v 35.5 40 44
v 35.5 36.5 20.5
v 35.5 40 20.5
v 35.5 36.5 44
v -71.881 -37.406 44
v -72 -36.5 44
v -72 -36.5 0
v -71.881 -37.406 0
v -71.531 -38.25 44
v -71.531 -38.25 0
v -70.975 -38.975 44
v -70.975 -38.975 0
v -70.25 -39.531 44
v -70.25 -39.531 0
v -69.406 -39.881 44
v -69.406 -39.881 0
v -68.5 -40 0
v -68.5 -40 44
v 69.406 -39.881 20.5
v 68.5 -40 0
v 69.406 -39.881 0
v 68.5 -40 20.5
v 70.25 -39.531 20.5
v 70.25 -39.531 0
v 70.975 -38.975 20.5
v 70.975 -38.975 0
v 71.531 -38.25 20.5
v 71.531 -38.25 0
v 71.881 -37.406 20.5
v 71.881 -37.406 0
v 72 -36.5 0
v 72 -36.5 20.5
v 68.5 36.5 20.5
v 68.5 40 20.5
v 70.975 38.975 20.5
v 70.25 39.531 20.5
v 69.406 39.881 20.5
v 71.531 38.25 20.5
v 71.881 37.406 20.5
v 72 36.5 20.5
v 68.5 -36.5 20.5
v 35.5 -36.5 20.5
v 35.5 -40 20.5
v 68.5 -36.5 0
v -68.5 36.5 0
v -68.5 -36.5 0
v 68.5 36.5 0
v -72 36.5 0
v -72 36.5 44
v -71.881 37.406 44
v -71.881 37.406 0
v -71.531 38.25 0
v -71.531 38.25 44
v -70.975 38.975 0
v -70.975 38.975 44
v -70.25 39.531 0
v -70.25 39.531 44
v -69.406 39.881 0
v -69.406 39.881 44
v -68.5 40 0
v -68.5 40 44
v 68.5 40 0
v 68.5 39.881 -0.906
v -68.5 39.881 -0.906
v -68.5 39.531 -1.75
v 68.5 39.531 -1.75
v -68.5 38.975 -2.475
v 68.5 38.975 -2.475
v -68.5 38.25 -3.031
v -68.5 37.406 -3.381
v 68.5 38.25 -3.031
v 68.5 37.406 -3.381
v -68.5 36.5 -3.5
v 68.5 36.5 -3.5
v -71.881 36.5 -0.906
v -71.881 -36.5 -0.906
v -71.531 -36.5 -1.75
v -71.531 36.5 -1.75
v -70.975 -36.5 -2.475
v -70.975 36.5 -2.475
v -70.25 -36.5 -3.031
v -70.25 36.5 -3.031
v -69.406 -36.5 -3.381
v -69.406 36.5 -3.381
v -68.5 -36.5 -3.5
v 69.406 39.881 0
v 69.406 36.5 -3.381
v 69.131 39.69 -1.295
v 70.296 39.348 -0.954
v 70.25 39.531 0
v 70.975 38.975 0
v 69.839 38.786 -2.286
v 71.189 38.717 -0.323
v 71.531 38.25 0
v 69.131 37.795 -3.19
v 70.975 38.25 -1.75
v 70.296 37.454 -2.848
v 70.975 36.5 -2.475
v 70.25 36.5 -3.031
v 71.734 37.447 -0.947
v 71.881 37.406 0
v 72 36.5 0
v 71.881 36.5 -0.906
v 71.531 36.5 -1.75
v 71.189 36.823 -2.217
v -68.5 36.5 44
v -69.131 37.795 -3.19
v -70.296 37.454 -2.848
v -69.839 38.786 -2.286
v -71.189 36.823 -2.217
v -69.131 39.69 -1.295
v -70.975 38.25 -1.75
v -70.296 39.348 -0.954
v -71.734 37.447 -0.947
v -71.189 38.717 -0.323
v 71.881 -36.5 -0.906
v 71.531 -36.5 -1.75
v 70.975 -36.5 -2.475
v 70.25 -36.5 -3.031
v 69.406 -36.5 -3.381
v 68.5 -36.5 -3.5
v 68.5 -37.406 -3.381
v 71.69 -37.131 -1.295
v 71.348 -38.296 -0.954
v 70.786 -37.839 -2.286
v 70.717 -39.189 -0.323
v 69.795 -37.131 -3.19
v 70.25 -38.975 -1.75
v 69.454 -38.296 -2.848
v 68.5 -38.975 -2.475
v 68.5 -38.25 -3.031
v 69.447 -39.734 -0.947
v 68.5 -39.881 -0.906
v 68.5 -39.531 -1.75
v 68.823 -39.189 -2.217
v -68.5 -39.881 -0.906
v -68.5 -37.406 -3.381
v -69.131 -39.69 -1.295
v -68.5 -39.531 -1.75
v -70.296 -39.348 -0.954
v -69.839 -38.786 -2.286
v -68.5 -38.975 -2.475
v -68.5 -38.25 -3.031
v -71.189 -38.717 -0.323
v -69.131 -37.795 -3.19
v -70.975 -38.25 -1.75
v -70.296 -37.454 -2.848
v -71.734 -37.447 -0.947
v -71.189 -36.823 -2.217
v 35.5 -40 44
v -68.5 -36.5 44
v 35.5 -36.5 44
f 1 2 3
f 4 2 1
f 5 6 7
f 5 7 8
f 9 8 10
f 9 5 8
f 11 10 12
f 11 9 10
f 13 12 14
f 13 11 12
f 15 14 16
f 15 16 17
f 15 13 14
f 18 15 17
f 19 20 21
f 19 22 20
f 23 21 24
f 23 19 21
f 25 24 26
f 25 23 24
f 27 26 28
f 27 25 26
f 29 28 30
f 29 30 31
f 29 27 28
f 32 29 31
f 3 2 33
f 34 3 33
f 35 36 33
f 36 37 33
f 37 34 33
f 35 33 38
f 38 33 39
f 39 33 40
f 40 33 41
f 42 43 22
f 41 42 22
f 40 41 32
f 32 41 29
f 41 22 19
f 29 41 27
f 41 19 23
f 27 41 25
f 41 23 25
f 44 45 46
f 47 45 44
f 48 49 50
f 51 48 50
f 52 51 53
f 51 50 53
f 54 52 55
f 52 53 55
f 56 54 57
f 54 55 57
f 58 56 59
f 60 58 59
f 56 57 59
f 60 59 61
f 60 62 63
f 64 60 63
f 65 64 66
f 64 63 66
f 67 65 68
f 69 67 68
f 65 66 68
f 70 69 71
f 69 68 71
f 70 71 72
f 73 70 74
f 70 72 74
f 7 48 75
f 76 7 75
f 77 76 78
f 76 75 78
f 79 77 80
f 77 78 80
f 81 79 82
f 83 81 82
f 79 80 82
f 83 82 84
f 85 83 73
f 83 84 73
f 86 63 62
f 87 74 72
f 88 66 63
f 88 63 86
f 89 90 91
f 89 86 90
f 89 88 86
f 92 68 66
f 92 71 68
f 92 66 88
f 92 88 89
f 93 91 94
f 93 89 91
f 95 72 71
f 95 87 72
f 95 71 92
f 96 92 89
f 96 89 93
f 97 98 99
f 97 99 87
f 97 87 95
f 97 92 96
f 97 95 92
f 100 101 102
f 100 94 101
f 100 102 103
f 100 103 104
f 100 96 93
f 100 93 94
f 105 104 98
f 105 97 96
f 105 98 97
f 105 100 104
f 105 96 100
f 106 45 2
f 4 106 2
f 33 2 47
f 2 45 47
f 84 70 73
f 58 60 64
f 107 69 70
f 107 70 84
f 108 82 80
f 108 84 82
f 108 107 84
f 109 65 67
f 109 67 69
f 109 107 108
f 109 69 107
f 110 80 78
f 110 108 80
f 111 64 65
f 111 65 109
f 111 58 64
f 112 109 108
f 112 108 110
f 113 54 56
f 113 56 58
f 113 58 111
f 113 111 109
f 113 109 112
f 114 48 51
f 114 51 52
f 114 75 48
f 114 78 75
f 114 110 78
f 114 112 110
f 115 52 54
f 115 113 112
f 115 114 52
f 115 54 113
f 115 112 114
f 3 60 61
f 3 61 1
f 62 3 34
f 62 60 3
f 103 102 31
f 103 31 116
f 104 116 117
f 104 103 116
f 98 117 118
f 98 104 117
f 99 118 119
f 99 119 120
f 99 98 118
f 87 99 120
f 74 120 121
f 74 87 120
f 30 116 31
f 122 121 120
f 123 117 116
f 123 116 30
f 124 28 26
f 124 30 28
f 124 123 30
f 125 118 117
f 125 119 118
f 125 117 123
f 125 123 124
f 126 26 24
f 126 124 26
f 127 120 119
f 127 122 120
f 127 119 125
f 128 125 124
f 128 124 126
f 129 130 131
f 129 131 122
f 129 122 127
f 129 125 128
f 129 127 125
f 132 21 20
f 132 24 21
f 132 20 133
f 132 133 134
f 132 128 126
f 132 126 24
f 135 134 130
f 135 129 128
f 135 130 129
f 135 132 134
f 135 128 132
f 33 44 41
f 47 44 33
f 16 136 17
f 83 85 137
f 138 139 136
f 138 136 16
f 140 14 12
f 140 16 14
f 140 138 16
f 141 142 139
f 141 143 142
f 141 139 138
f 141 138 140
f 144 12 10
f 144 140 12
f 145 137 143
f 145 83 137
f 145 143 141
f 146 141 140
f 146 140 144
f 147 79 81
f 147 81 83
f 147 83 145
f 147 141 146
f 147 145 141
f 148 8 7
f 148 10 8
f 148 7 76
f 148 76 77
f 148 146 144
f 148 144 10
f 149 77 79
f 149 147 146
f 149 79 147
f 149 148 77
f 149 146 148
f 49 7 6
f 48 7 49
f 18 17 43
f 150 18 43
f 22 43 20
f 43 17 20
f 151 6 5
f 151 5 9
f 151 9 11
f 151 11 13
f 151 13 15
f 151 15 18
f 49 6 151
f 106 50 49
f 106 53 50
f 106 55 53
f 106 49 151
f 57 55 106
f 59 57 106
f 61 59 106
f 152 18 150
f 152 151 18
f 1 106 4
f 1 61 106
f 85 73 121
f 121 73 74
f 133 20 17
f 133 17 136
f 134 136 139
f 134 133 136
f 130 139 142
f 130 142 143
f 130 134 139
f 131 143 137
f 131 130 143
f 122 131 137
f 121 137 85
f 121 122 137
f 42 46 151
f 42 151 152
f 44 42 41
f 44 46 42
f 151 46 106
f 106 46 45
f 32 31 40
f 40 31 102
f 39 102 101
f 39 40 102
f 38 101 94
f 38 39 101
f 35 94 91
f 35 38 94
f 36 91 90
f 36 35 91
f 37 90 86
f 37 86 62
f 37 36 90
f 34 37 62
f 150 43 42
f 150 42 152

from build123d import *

# Parameters (mm, degrees)
SKETCH_W     = 137
SKETCH_H     = 73
PAD_DEPTH    = 44
THICKNESS_T  = 3.5
SKETCH001_W  = 36.5
SKETCH001_H  = 23.5
POCKET_DEPTH = 89


with BuildPart() as part:
    # Sketch → Pad (new body)
    with BuildSketch(Plane.XY):
        Rectangle(SKETCH_W, SKETCH_H)
    extrude(amount=PAD_DEPTH)

    # Thickness
    thickness_openings = [part.faces().sort_by_distance(p)[0] for p in [
        (0, 0, 44),
    ]]
    offset(amount=THICKNESS_T, openings=thickness_openings)

    # Sketch001 (on Face12 of Thickness) → Pocket (cut)
    with BuildSketch(Plane.XZ.offset(40)):
        with Locations((53.75, 32.25)):
            Rectangle(SKETCH001_W, SKETCH001_H)
    extrude(amount=-POCKET_DEPTH, mode=Mode.SUBTRACT)


solid = part.part
